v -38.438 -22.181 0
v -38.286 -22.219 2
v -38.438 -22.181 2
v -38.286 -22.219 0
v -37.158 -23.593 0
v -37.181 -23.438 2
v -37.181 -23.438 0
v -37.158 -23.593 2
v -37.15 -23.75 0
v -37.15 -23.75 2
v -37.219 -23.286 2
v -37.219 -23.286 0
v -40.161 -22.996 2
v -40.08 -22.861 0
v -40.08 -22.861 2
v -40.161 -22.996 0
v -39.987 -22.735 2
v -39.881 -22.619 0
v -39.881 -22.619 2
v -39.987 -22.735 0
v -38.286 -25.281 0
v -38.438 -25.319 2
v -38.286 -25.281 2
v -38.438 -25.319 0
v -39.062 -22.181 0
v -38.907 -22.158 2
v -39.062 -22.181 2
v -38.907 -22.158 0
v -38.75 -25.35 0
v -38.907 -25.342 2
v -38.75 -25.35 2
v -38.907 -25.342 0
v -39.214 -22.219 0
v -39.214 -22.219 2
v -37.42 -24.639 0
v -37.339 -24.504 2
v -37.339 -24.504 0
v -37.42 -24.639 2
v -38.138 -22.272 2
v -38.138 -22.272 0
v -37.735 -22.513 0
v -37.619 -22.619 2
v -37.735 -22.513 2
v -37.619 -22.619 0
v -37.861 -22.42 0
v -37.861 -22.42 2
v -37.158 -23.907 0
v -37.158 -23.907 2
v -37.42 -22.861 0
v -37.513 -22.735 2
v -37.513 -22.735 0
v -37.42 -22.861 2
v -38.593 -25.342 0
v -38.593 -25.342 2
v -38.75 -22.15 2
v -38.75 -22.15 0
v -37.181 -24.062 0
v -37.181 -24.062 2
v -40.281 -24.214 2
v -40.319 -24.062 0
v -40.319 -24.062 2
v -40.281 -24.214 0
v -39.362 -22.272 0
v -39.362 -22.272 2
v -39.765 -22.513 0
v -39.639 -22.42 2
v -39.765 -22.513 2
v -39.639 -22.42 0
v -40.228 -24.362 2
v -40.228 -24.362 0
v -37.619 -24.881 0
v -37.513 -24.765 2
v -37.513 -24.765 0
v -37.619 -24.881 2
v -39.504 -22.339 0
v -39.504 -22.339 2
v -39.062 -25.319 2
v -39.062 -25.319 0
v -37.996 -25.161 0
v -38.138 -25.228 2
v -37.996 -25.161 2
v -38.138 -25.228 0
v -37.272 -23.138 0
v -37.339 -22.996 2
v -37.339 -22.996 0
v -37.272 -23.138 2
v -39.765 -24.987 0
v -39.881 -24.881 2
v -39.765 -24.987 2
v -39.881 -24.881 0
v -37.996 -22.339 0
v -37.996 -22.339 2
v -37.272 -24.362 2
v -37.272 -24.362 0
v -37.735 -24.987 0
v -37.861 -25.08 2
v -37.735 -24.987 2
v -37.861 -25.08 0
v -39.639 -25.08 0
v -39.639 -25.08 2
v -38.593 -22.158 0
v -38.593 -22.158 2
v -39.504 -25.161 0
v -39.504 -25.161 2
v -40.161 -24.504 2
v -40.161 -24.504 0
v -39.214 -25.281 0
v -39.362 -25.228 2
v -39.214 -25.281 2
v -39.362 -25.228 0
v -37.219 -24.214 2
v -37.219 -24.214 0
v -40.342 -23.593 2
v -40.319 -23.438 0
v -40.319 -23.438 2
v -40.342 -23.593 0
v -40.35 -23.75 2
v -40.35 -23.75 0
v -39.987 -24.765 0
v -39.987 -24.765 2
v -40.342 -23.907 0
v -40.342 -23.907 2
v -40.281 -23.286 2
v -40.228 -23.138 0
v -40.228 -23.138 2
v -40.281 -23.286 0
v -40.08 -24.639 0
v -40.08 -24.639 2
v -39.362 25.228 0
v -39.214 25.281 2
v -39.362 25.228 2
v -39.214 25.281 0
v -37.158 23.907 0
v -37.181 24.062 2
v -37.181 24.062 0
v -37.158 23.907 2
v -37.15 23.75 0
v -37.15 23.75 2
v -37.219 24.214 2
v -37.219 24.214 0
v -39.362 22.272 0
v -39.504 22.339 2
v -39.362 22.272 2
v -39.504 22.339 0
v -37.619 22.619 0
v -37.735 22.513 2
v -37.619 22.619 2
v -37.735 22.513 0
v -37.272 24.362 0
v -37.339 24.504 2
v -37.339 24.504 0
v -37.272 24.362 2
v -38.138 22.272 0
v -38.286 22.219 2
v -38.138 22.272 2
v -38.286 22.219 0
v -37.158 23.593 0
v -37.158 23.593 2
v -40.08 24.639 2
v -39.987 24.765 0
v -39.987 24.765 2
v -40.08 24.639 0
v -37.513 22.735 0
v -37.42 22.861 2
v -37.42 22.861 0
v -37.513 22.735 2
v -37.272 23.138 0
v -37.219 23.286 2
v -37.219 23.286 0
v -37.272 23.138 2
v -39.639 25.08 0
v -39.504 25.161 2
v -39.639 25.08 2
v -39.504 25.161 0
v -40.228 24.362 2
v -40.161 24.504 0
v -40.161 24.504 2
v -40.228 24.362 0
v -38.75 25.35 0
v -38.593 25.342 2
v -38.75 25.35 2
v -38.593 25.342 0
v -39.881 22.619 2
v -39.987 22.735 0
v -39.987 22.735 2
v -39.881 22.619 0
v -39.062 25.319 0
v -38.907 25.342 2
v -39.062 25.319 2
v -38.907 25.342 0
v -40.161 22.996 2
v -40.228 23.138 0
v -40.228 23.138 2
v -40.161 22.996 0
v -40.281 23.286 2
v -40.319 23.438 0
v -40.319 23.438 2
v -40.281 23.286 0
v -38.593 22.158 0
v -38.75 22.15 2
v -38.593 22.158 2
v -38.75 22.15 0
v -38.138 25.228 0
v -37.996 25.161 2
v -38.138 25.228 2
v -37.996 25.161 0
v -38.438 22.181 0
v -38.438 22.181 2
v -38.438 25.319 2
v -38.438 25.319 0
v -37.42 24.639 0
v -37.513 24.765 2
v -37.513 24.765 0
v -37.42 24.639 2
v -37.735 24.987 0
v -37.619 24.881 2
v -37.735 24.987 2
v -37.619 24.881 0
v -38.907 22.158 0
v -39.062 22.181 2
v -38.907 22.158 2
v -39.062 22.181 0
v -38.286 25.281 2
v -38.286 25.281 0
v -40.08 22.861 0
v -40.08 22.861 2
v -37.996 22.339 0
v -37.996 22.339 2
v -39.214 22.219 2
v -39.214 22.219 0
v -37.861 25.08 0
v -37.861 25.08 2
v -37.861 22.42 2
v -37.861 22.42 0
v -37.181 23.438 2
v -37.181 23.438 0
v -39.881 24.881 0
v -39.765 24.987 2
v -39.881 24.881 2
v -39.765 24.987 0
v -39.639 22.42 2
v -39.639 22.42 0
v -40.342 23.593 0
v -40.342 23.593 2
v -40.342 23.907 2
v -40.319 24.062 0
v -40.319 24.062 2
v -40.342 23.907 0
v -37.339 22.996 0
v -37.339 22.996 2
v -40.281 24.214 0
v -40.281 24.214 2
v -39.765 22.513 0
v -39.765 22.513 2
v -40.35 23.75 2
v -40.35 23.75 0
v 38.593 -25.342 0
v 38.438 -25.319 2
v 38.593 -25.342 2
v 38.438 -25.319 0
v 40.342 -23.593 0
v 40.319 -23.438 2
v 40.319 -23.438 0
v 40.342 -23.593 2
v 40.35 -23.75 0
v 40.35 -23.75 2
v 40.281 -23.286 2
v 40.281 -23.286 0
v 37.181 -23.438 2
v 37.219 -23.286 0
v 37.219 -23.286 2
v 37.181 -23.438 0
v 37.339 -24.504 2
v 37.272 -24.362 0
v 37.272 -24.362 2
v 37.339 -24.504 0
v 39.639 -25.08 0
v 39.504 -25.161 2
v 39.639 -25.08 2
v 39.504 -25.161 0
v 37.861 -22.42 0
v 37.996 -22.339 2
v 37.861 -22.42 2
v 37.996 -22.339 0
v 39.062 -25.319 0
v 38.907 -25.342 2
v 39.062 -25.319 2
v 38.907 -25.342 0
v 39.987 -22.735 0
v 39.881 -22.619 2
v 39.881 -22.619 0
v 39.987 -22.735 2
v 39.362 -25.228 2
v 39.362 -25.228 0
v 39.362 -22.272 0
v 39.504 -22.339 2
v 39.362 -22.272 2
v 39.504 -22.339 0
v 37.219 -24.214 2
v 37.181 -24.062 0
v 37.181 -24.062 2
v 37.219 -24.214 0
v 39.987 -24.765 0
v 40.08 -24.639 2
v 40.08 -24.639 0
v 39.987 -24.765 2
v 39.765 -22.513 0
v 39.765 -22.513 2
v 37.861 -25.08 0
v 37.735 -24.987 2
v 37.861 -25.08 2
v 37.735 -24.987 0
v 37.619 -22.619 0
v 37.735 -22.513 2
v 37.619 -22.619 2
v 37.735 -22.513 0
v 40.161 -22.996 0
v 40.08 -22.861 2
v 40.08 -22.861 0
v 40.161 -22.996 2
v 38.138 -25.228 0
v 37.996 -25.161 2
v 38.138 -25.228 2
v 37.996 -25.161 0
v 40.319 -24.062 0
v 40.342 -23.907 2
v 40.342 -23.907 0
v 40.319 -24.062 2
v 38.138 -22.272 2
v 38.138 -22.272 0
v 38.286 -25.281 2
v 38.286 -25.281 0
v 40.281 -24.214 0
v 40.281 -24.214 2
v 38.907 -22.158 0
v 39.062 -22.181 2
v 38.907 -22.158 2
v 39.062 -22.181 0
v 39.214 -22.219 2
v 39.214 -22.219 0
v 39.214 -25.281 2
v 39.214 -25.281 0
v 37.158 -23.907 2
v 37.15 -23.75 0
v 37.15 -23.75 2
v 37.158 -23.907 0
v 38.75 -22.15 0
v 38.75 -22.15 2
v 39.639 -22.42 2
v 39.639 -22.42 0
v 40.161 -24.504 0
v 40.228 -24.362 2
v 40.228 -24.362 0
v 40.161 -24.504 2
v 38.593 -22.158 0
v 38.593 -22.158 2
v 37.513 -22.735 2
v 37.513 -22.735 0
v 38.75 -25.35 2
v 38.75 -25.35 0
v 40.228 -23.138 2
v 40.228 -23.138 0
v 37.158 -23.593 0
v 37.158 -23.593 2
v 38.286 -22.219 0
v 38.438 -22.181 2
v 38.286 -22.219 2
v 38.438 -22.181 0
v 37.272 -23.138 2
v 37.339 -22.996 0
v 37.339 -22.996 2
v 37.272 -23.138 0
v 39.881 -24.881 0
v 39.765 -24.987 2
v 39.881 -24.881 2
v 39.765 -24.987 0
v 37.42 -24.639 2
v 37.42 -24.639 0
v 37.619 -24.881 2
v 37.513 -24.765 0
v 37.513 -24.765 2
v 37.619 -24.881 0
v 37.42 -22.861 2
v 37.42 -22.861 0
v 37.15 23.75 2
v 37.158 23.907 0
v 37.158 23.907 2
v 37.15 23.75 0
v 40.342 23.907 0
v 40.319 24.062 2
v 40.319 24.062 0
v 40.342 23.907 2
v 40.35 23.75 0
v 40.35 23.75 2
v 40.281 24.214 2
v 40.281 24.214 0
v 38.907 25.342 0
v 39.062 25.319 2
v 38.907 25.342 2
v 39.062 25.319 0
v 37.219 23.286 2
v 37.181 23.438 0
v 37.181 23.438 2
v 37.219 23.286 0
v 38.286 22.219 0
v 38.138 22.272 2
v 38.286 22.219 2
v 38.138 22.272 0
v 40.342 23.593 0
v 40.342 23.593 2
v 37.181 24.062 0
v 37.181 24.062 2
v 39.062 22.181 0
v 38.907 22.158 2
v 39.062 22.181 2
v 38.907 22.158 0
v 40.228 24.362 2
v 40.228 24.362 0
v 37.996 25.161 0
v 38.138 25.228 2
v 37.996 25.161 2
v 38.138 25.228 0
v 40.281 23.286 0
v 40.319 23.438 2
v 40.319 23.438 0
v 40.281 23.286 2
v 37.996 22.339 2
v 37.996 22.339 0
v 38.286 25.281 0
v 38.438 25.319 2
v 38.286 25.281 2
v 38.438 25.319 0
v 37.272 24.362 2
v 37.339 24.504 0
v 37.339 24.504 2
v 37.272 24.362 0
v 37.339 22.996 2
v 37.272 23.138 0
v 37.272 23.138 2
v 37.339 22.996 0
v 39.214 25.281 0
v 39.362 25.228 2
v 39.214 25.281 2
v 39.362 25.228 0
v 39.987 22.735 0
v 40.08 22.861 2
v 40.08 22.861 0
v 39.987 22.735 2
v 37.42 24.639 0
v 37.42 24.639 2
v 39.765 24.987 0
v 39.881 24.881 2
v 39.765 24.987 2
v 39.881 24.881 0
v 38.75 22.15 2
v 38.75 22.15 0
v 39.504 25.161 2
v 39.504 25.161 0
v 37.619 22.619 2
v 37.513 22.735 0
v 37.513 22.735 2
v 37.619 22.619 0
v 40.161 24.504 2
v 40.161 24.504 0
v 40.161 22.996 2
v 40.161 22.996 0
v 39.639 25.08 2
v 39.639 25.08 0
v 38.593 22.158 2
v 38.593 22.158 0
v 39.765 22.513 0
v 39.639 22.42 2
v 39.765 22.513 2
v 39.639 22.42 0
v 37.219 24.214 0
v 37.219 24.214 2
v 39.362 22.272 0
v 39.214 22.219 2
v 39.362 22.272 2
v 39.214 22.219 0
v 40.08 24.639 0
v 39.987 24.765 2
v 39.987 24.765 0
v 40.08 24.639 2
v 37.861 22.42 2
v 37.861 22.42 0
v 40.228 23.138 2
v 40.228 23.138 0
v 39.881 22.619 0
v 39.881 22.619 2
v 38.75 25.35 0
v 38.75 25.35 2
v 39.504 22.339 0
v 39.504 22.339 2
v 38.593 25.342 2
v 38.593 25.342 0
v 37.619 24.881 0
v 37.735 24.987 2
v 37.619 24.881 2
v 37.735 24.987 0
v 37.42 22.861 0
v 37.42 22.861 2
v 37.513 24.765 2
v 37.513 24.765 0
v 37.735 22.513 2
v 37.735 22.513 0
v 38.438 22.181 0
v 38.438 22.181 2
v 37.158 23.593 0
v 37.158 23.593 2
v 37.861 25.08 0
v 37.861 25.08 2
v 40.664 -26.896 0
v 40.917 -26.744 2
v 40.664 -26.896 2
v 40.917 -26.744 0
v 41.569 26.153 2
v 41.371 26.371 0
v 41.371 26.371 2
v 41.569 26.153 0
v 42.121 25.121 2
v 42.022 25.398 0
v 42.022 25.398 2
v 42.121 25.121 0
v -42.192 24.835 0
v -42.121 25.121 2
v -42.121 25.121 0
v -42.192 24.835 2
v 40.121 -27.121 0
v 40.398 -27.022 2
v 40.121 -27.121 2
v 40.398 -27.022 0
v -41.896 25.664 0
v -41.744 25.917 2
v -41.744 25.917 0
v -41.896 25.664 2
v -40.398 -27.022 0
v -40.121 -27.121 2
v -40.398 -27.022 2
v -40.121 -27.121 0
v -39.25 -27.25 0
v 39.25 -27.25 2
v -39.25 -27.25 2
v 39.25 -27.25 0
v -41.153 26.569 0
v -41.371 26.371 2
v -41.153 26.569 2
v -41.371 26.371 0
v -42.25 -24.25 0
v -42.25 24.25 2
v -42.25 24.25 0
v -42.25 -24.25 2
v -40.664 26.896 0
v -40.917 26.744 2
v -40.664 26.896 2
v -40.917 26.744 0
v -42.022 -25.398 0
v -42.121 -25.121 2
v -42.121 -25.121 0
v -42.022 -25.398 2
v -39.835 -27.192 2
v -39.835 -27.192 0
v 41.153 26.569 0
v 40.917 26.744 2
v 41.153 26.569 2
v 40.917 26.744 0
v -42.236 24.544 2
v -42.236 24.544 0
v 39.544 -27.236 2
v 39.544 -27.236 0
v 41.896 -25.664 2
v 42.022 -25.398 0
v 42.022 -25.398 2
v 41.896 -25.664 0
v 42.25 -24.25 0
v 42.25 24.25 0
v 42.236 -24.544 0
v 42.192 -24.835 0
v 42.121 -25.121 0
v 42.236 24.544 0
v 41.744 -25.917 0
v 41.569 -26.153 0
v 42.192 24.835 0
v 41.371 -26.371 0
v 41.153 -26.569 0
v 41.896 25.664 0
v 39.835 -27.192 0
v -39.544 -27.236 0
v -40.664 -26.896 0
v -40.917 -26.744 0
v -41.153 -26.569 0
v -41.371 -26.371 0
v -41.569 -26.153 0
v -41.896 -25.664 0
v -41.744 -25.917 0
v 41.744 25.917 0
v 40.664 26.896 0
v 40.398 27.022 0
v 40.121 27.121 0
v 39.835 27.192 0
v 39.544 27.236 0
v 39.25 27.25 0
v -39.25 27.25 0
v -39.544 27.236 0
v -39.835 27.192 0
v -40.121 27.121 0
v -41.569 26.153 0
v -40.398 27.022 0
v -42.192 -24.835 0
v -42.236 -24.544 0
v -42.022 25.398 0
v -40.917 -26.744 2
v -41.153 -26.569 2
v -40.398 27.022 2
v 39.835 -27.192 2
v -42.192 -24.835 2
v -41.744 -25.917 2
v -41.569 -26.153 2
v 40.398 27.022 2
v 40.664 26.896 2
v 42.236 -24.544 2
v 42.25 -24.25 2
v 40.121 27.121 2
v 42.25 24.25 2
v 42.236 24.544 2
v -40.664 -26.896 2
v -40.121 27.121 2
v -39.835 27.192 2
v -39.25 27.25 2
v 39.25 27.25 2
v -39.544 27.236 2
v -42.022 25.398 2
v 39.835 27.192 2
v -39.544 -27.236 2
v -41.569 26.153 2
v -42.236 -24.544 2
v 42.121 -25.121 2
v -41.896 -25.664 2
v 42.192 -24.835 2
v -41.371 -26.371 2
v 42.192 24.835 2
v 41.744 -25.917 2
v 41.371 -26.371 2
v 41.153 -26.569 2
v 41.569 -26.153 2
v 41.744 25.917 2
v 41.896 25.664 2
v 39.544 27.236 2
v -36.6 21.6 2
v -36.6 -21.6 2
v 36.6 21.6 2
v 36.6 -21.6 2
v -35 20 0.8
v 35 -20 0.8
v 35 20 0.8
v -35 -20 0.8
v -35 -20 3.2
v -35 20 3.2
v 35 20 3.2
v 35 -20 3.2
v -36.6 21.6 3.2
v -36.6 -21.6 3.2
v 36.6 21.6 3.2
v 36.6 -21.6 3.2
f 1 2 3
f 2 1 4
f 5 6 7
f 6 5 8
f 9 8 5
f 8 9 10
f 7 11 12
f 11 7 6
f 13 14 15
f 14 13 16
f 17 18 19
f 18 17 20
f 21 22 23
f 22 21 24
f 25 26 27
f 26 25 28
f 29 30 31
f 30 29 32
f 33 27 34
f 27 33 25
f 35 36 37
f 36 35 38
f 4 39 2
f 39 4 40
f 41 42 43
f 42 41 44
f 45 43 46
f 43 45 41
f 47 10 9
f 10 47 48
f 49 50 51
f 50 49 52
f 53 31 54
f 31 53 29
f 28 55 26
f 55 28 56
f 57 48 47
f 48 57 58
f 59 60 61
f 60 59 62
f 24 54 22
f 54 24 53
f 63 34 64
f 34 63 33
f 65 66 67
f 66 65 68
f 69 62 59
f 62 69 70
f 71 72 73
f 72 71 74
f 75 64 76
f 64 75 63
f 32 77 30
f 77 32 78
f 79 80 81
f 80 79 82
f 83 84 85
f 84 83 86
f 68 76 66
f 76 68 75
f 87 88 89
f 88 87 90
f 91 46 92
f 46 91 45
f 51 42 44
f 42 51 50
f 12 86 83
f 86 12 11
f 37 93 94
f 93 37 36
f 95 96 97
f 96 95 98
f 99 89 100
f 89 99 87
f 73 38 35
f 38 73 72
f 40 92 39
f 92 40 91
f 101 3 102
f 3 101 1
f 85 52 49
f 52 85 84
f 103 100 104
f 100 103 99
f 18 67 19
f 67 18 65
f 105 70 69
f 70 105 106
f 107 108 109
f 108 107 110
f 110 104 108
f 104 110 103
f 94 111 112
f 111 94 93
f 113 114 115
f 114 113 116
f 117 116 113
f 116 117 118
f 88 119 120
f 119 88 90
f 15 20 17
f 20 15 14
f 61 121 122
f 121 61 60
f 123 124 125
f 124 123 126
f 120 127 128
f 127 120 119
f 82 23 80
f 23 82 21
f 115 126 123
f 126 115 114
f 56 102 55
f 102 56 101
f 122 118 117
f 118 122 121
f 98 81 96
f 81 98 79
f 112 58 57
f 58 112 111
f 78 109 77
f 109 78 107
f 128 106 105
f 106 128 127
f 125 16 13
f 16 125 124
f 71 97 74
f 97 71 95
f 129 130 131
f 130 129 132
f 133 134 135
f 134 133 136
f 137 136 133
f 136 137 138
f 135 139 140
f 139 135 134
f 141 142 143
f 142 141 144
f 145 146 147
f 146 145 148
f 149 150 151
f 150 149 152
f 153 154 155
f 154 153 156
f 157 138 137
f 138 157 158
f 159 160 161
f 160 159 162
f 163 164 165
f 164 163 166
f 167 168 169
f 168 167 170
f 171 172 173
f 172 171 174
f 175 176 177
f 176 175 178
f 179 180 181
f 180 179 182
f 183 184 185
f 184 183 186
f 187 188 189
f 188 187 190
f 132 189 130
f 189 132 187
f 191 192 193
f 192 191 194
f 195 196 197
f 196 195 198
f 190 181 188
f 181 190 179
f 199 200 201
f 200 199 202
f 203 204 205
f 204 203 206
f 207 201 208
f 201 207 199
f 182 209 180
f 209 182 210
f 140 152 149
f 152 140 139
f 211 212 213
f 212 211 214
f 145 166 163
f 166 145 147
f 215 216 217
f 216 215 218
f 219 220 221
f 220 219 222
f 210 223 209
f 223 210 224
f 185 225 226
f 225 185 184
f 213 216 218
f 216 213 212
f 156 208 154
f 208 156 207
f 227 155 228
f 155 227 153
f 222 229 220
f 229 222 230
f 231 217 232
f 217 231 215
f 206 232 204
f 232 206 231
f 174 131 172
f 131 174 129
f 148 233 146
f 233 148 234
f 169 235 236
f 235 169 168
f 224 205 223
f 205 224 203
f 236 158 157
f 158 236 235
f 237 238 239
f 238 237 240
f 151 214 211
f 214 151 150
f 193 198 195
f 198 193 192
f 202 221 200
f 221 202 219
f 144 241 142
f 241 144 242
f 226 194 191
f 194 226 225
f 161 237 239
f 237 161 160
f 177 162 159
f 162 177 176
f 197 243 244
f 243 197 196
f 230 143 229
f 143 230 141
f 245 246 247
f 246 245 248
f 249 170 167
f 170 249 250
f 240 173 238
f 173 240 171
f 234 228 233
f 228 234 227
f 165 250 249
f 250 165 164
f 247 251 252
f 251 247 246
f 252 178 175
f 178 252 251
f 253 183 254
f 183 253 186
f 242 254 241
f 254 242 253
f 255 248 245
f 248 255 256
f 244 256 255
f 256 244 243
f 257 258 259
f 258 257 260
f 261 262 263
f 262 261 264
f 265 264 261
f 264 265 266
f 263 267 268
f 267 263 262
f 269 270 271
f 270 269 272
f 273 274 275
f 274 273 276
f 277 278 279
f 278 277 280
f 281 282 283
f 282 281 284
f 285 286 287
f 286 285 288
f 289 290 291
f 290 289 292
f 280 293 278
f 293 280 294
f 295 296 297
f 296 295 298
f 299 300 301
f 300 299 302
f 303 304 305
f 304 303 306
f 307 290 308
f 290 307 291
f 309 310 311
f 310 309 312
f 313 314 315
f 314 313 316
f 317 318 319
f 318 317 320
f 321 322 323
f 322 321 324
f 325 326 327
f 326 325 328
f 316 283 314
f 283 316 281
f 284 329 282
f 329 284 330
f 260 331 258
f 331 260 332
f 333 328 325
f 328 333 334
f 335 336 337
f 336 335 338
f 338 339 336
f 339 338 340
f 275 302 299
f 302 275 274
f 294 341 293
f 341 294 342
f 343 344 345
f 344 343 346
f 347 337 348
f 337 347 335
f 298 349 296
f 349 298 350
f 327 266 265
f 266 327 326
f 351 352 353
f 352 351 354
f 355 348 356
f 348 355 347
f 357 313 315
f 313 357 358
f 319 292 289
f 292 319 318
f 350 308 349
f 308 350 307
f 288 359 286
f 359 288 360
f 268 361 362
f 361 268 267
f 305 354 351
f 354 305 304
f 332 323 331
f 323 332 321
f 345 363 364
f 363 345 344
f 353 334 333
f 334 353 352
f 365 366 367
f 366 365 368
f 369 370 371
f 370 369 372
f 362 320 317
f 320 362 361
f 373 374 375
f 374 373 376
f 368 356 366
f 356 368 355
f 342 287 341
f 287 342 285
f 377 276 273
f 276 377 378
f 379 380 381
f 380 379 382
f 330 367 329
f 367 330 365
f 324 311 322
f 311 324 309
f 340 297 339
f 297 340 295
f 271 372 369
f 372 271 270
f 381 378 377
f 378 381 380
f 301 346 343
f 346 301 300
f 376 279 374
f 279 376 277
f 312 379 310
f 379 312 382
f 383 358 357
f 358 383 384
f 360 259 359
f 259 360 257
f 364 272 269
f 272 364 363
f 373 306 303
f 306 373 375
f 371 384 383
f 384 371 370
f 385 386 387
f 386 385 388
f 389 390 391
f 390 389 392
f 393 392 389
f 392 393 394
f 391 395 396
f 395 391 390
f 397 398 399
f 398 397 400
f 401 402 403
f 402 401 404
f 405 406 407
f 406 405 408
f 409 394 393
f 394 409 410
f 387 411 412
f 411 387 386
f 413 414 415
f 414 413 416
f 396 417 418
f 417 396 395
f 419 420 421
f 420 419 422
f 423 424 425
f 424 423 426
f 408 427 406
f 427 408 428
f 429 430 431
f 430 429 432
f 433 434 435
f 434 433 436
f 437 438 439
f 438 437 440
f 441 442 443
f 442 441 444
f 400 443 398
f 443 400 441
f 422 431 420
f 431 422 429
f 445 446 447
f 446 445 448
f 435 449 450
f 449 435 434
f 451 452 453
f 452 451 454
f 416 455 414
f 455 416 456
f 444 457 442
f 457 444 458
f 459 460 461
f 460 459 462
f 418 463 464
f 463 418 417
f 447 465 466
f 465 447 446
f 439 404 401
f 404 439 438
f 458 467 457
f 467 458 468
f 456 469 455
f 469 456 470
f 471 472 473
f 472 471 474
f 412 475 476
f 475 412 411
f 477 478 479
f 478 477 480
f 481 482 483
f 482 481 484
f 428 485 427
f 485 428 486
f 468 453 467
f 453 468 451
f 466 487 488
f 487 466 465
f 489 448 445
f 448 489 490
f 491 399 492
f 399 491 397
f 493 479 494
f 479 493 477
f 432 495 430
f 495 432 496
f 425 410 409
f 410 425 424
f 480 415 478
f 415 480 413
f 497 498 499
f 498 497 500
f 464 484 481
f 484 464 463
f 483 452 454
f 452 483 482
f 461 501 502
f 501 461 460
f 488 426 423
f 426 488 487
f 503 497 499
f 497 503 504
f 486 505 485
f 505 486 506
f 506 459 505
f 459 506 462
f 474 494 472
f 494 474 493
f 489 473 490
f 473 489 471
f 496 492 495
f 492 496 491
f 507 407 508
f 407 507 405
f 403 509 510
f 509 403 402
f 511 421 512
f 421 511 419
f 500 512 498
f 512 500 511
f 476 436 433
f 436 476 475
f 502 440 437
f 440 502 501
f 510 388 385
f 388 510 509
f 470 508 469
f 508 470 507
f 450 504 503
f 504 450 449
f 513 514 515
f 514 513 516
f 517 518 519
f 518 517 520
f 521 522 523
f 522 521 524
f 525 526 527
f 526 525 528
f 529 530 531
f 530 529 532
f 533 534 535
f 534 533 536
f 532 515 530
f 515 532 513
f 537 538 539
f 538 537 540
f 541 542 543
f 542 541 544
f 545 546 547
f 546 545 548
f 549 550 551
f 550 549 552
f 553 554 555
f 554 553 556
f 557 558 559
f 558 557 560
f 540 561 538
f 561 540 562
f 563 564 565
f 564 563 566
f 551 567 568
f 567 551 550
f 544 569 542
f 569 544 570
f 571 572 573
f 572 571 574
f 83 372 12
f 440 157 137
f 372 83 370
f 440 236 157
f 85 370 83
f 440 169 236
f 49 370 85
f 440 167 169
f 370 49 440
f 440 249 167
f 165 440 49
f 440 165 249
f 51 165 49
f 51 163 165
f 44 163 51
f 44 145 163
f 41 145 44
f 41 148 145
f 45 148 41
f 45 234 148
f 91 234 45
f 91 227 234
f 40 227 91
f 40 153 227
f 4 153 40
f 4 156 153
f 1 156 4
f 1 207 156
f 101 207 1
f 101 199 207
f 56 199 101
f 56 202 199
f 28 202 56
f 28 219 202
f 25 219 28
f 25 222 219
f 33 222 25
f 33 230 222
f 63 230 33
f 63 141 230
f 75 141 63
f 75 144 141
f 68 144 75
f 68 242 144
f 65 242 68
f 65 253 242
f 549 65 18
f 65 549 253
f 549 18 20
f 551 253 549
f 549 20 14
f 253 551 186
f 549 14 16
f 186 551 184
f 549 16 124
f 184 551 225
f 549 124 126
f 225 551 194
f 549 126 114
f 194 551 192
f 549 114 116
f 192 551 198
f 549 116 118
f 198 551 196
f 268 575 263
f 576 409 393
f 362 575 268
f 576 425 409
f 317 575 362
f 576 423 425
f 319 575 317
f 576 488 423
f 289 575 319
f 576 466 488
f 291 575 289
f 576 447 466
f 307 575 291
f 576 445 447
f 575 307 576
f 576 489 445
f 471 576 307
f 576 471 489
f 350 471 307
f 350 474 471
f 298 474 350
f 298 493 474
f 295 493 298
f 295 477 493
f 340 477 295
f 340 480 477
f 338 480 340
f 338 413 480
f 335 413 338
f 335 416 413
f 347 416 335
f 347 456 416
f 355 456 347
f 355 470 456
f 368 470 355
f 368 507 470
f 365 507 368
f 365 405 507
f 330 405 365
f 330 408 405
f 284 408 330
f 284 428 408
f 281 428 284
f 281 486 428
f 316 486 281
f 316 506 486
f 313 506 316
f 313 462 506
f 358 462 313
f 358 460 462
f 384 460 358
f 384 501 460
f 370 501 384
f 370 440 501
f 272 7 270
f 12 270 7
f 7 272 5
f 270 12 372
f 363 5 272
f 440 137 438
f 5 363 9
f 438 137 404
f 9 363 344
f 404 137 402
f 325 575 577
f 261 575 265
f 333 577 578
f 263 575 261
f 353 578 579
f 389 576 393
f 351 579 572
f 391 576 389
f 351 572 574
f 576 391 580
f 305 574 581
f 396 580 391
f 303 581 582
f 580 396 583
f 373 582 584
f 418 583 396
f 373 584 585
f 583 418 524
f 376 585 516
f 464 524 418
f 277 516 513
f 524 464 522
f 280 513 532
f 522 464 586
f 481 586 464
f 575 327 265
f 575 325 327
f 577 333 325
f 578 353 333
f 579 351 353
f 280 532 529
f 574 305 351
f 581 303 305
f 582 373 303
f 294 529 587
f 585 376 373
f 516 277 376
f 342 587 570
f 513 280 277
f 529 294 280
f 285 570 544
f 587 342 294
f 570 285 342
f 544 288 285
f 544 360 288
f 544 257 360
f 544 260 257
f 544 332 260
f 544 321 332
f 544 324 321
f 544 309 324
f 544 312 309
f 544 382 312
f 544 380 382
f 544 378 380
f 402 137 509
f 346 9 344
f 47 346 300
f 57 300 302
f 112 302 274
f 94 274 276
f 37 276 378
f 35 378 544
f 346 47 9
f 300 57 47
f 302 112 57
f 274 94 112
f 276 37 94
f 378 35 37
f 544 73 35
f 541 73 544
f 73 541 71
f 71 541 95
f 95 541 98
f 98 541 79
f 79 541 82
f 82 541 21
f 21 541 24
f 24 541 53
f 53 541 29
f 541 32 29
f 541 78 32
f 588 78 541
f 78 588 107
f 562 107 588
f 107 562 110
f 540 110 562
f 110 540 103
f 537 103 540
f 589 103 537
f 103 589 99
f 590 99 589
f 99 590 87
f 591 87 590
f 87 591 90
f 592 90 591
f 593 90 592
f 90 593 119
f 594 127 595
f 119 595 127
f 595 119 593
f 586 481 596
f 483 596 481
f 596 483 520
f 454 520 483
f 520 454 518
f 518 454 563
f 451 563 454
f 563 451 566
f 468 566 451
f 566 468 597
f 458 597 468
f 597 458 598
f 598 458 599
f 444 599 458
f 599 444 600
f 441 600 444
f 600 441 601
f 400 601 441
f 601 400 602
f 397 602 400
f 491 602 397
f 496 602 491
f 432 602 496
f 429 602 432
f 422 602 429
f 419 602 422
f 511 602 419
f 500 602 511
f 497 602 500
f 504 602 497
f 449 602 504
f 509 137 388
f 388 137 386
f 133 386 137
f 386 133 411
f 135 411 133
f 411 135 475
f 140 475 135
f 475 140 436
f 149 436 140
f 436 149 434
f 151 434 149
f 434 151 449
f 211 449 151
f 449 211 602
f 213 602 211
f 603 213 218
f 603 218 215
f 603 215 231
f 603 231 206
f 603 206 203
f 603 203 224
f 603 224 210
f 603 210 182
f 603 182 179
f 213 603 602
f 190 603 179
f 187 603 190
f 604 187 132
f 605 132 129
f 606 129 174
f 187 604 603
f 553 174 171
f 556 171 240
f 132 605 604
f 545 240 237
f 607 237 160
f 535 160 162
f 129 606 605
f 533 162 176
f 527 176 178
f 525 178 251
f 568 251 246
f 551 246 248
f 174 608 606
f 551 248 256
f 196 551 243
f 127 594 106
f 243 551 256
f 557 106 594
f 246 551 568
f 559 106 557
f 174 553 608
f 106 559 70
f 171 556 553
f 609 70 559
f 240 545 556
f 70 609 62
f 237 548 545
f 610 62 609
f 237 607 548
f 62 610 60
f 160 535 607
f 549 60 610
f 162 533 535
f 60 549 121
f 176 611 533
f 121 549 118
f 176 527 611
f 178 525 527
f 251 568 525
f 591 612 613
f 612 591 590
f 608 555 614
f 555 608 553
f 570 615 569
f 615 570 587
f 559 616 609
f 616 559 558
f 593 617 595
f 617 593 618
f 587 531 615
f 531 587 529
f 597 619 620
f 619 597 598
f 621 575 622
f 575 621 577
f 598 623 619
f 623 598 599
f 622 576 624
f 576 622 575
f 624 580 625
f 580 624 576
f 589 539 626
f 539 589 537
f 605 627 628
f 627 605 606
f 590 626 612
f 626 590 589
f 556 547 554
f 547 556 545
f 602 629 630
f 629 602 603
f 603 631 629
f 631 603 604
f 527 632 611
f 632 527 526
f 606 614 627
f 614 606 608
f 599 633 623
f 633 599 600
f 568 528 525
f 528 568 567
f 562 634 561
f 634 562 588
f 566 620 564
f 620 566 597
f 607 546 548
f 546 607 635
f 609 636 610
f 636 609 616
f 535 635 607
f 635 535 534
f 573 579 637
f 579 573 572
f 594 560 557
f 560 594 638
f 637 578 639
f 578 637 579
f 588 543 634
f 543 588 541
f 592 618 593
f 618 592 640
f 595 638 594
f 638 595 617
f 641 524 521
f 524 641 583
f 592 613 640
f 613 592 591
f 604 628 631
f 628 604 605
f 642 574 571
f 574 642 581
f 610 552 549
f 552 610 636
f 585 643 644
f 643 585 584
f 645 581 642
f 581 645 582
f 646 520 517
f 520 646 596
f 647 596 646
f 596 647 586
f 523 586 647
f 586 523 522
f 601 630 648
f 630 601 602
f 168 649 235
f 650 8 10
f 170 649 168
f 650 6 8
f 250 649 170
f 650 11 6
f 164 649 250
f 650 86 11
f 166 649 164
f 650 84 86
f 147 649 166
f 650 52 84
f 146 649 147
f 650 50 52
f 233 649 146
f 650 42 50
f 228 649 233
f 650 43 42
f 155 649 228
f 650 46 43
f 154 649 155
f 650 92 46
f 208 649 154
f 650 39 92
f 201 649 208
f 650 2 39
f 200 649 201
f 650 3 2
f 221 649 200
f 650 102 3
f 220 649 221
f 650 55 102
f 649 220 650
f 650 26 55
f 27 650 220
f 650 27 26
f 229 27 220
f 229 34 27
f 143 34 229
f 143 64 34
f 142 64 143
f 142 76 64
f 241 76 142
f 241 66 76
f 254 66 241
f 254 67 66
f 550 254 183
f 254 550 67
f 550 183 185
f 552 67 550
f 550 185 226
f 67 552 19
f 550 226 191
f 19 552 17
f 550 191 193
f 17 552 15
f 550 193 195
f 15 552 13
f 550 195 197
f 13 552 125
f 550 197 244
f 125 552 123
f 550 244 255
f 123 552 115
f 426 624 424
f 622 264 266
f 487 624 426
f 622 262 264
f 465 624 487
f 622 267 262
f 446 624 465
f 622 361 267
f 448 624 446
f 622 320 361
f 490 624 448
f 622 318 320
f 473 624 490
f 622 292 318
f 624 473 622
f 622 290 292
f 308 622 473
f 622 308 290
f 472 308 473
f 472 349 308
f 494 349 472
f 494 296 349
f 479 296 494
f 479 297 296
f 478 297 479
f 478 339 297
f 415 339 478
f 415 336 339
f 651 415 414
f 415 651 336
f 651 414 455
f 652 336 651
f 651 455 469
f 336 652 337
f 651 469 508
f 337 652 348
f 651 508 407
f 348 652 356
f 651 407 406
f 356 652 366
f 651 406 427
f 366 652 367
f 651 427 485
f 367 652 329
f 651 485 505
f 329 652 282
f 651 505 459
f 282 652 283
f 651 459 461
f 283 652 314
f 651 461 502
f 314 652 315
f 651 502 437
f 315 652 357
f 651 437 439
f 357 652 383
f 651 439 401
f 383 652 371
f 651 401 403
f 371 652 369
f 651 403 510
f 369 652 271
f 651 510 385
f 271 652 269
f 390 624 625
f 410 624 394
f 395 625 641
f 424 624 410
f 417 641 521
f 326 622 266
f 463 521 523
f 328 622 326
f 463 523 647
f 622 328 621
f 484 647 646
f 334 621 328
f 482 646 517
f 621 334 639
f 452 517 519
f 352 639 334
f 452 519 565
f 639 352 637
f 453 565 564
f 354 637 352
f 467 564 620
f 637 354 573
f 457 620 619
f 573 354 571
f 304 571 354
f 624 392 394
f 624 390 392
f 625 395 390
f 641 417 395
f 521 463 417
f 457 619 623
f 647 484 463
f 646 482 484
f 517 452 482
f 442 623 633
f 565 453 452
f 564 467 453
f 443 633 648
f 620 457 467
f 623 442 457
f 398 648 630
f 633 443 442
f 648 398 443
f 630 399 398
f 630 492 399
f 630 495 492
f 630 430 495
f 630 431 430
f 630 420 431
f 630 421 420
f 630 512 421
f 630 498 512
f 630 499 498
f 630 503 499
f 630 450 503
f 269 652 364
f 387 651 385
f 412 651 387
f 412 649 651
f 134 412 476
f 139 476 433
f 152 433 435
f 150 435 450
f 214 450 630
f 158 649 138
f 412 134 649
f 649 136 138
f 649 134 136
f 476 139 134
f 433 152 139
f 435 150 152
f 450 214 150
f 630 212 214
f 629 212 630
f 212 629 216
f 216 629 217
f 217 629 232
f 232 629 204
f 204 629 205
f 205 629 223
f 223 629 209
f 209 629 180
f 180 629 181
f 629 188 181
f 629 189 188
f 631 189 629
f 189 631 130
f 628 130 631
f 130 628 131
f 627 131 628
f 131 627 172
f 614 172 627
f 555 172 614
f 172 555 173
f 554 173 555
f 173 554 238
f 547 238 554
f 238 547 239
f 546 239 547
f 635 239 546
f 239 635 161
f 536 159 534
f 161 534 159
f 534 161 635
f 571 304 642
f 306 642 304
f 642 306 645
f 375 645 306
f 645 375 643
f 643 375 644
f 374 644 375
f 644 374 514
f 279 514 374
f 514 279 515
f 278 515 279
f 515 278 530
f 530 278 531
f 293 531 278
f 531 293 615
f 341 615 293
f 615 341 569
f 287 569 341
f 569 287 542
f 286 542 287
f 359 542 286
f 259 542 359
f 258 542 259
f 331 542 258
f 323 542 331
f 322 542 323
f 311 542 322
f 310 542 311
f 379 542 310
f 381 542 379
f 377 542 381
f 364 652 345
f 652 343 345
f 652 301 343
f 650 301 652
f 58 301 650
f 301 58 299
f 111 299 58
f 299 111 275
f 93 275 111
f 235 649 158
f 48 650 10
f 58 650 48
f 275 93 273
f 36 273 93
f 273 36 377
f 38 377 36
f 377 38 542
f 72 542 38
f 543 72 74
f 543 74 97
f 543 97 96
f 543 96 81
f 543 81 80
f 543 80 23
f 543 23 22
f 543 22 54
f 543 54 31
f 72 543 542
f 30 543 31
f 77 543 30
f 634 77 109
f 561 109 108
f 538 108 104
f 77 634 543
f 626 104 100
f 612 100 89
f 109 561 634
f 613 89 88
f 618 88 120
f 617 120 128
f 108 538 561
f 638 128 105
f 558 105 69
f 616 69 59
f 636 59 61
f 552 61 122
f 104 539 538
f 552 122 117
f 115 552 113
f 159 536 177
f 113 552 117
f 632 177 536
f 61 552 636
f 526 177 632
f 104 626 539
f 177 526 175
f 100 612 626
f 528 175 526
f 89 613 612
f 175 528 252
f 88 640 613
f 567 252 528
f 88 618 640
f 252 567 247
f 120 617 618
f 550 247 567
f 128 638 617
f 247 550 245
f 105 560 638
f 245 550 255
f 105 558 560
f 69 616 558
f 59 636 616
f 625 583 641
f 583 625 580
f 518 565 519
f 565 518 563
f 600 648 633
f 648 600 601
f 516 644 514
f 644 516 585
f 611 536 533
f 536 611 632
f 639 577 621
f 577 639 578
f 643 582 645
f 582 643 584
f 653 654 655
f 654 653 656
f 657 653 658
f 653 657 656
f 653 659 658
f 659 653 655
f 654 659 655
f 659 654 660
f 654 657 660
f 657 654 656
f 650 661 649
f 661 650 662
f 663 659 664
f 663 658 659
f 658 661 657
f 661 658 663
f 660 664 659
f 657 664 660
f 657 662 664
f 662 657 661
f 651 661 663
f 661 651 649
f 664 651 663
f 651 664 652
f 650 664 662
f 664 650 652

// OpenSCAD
$fn=64;

// Display Module v3.0
// Overall: 84.5mm x 54.5mm

module display_module_v3(
    L=84.5,   // length (X)
    W=54.5,   // width  (Y)
    T=2.0,    // PCB thickness
    corner_r=3.0,

    // Mounting holes (typical 4-corner pattern)
    hole_d=3.2,
    hole_edge_x=3.5,   // hole center offset from X edges
    hole_edge_y=3.5,   // hole center offset from Y edges

    // Display window / cutout (approx)
    window_L=70.0,
    window_W=40.0,
    window_depth=1.2,
    window_offset_x=0.0,
    window_offset_y=0.0,

    // Optional bezel/raised frame around window
    bezel_h=1.2,
    bezel_t=1.6
){
    module rounded_plate(l,w,t,r){
        linear_extrude(height=t)
            offset(r=r)
                square([l-2*r, w-2*r], center=true);
    }

    module holes(){
        for (sx=[-1,1], sy=[-1,1]){
            translate([sx*(L/2 - hole_edge_x), sy*(W/2 - hole_edge_y), -0.5])
                cylinder(d=hole_d, h=T+1.0);
        }
    }

    module window_cut(){
        translate([window_offset_x, window_offset_y, T-window_depth])
            linear_extrude(height=window_depth+0.6)
                square([window_L, window_W], center=true);
    }

    module bezel(){
        // A simple raised rectangular frame around the window
        translate([window_offset_x, window_offset_y, T])
        difference(){
            linear_extrude(height=bezel_h)
                square([window_L + 2*bezel_t, window_W + 2*bezel_t], center=true);
            translate([0,0,-0.1])
                linear_extrude(height=bezel_h+0.2)
                    square([window_L, window_W], center=true);
        }
    }

    difference(){
        rounded_plate(L,W,T,corner_r);
        holes();
        window_cut();
    }

    bezel();
}

display_module_v3();
